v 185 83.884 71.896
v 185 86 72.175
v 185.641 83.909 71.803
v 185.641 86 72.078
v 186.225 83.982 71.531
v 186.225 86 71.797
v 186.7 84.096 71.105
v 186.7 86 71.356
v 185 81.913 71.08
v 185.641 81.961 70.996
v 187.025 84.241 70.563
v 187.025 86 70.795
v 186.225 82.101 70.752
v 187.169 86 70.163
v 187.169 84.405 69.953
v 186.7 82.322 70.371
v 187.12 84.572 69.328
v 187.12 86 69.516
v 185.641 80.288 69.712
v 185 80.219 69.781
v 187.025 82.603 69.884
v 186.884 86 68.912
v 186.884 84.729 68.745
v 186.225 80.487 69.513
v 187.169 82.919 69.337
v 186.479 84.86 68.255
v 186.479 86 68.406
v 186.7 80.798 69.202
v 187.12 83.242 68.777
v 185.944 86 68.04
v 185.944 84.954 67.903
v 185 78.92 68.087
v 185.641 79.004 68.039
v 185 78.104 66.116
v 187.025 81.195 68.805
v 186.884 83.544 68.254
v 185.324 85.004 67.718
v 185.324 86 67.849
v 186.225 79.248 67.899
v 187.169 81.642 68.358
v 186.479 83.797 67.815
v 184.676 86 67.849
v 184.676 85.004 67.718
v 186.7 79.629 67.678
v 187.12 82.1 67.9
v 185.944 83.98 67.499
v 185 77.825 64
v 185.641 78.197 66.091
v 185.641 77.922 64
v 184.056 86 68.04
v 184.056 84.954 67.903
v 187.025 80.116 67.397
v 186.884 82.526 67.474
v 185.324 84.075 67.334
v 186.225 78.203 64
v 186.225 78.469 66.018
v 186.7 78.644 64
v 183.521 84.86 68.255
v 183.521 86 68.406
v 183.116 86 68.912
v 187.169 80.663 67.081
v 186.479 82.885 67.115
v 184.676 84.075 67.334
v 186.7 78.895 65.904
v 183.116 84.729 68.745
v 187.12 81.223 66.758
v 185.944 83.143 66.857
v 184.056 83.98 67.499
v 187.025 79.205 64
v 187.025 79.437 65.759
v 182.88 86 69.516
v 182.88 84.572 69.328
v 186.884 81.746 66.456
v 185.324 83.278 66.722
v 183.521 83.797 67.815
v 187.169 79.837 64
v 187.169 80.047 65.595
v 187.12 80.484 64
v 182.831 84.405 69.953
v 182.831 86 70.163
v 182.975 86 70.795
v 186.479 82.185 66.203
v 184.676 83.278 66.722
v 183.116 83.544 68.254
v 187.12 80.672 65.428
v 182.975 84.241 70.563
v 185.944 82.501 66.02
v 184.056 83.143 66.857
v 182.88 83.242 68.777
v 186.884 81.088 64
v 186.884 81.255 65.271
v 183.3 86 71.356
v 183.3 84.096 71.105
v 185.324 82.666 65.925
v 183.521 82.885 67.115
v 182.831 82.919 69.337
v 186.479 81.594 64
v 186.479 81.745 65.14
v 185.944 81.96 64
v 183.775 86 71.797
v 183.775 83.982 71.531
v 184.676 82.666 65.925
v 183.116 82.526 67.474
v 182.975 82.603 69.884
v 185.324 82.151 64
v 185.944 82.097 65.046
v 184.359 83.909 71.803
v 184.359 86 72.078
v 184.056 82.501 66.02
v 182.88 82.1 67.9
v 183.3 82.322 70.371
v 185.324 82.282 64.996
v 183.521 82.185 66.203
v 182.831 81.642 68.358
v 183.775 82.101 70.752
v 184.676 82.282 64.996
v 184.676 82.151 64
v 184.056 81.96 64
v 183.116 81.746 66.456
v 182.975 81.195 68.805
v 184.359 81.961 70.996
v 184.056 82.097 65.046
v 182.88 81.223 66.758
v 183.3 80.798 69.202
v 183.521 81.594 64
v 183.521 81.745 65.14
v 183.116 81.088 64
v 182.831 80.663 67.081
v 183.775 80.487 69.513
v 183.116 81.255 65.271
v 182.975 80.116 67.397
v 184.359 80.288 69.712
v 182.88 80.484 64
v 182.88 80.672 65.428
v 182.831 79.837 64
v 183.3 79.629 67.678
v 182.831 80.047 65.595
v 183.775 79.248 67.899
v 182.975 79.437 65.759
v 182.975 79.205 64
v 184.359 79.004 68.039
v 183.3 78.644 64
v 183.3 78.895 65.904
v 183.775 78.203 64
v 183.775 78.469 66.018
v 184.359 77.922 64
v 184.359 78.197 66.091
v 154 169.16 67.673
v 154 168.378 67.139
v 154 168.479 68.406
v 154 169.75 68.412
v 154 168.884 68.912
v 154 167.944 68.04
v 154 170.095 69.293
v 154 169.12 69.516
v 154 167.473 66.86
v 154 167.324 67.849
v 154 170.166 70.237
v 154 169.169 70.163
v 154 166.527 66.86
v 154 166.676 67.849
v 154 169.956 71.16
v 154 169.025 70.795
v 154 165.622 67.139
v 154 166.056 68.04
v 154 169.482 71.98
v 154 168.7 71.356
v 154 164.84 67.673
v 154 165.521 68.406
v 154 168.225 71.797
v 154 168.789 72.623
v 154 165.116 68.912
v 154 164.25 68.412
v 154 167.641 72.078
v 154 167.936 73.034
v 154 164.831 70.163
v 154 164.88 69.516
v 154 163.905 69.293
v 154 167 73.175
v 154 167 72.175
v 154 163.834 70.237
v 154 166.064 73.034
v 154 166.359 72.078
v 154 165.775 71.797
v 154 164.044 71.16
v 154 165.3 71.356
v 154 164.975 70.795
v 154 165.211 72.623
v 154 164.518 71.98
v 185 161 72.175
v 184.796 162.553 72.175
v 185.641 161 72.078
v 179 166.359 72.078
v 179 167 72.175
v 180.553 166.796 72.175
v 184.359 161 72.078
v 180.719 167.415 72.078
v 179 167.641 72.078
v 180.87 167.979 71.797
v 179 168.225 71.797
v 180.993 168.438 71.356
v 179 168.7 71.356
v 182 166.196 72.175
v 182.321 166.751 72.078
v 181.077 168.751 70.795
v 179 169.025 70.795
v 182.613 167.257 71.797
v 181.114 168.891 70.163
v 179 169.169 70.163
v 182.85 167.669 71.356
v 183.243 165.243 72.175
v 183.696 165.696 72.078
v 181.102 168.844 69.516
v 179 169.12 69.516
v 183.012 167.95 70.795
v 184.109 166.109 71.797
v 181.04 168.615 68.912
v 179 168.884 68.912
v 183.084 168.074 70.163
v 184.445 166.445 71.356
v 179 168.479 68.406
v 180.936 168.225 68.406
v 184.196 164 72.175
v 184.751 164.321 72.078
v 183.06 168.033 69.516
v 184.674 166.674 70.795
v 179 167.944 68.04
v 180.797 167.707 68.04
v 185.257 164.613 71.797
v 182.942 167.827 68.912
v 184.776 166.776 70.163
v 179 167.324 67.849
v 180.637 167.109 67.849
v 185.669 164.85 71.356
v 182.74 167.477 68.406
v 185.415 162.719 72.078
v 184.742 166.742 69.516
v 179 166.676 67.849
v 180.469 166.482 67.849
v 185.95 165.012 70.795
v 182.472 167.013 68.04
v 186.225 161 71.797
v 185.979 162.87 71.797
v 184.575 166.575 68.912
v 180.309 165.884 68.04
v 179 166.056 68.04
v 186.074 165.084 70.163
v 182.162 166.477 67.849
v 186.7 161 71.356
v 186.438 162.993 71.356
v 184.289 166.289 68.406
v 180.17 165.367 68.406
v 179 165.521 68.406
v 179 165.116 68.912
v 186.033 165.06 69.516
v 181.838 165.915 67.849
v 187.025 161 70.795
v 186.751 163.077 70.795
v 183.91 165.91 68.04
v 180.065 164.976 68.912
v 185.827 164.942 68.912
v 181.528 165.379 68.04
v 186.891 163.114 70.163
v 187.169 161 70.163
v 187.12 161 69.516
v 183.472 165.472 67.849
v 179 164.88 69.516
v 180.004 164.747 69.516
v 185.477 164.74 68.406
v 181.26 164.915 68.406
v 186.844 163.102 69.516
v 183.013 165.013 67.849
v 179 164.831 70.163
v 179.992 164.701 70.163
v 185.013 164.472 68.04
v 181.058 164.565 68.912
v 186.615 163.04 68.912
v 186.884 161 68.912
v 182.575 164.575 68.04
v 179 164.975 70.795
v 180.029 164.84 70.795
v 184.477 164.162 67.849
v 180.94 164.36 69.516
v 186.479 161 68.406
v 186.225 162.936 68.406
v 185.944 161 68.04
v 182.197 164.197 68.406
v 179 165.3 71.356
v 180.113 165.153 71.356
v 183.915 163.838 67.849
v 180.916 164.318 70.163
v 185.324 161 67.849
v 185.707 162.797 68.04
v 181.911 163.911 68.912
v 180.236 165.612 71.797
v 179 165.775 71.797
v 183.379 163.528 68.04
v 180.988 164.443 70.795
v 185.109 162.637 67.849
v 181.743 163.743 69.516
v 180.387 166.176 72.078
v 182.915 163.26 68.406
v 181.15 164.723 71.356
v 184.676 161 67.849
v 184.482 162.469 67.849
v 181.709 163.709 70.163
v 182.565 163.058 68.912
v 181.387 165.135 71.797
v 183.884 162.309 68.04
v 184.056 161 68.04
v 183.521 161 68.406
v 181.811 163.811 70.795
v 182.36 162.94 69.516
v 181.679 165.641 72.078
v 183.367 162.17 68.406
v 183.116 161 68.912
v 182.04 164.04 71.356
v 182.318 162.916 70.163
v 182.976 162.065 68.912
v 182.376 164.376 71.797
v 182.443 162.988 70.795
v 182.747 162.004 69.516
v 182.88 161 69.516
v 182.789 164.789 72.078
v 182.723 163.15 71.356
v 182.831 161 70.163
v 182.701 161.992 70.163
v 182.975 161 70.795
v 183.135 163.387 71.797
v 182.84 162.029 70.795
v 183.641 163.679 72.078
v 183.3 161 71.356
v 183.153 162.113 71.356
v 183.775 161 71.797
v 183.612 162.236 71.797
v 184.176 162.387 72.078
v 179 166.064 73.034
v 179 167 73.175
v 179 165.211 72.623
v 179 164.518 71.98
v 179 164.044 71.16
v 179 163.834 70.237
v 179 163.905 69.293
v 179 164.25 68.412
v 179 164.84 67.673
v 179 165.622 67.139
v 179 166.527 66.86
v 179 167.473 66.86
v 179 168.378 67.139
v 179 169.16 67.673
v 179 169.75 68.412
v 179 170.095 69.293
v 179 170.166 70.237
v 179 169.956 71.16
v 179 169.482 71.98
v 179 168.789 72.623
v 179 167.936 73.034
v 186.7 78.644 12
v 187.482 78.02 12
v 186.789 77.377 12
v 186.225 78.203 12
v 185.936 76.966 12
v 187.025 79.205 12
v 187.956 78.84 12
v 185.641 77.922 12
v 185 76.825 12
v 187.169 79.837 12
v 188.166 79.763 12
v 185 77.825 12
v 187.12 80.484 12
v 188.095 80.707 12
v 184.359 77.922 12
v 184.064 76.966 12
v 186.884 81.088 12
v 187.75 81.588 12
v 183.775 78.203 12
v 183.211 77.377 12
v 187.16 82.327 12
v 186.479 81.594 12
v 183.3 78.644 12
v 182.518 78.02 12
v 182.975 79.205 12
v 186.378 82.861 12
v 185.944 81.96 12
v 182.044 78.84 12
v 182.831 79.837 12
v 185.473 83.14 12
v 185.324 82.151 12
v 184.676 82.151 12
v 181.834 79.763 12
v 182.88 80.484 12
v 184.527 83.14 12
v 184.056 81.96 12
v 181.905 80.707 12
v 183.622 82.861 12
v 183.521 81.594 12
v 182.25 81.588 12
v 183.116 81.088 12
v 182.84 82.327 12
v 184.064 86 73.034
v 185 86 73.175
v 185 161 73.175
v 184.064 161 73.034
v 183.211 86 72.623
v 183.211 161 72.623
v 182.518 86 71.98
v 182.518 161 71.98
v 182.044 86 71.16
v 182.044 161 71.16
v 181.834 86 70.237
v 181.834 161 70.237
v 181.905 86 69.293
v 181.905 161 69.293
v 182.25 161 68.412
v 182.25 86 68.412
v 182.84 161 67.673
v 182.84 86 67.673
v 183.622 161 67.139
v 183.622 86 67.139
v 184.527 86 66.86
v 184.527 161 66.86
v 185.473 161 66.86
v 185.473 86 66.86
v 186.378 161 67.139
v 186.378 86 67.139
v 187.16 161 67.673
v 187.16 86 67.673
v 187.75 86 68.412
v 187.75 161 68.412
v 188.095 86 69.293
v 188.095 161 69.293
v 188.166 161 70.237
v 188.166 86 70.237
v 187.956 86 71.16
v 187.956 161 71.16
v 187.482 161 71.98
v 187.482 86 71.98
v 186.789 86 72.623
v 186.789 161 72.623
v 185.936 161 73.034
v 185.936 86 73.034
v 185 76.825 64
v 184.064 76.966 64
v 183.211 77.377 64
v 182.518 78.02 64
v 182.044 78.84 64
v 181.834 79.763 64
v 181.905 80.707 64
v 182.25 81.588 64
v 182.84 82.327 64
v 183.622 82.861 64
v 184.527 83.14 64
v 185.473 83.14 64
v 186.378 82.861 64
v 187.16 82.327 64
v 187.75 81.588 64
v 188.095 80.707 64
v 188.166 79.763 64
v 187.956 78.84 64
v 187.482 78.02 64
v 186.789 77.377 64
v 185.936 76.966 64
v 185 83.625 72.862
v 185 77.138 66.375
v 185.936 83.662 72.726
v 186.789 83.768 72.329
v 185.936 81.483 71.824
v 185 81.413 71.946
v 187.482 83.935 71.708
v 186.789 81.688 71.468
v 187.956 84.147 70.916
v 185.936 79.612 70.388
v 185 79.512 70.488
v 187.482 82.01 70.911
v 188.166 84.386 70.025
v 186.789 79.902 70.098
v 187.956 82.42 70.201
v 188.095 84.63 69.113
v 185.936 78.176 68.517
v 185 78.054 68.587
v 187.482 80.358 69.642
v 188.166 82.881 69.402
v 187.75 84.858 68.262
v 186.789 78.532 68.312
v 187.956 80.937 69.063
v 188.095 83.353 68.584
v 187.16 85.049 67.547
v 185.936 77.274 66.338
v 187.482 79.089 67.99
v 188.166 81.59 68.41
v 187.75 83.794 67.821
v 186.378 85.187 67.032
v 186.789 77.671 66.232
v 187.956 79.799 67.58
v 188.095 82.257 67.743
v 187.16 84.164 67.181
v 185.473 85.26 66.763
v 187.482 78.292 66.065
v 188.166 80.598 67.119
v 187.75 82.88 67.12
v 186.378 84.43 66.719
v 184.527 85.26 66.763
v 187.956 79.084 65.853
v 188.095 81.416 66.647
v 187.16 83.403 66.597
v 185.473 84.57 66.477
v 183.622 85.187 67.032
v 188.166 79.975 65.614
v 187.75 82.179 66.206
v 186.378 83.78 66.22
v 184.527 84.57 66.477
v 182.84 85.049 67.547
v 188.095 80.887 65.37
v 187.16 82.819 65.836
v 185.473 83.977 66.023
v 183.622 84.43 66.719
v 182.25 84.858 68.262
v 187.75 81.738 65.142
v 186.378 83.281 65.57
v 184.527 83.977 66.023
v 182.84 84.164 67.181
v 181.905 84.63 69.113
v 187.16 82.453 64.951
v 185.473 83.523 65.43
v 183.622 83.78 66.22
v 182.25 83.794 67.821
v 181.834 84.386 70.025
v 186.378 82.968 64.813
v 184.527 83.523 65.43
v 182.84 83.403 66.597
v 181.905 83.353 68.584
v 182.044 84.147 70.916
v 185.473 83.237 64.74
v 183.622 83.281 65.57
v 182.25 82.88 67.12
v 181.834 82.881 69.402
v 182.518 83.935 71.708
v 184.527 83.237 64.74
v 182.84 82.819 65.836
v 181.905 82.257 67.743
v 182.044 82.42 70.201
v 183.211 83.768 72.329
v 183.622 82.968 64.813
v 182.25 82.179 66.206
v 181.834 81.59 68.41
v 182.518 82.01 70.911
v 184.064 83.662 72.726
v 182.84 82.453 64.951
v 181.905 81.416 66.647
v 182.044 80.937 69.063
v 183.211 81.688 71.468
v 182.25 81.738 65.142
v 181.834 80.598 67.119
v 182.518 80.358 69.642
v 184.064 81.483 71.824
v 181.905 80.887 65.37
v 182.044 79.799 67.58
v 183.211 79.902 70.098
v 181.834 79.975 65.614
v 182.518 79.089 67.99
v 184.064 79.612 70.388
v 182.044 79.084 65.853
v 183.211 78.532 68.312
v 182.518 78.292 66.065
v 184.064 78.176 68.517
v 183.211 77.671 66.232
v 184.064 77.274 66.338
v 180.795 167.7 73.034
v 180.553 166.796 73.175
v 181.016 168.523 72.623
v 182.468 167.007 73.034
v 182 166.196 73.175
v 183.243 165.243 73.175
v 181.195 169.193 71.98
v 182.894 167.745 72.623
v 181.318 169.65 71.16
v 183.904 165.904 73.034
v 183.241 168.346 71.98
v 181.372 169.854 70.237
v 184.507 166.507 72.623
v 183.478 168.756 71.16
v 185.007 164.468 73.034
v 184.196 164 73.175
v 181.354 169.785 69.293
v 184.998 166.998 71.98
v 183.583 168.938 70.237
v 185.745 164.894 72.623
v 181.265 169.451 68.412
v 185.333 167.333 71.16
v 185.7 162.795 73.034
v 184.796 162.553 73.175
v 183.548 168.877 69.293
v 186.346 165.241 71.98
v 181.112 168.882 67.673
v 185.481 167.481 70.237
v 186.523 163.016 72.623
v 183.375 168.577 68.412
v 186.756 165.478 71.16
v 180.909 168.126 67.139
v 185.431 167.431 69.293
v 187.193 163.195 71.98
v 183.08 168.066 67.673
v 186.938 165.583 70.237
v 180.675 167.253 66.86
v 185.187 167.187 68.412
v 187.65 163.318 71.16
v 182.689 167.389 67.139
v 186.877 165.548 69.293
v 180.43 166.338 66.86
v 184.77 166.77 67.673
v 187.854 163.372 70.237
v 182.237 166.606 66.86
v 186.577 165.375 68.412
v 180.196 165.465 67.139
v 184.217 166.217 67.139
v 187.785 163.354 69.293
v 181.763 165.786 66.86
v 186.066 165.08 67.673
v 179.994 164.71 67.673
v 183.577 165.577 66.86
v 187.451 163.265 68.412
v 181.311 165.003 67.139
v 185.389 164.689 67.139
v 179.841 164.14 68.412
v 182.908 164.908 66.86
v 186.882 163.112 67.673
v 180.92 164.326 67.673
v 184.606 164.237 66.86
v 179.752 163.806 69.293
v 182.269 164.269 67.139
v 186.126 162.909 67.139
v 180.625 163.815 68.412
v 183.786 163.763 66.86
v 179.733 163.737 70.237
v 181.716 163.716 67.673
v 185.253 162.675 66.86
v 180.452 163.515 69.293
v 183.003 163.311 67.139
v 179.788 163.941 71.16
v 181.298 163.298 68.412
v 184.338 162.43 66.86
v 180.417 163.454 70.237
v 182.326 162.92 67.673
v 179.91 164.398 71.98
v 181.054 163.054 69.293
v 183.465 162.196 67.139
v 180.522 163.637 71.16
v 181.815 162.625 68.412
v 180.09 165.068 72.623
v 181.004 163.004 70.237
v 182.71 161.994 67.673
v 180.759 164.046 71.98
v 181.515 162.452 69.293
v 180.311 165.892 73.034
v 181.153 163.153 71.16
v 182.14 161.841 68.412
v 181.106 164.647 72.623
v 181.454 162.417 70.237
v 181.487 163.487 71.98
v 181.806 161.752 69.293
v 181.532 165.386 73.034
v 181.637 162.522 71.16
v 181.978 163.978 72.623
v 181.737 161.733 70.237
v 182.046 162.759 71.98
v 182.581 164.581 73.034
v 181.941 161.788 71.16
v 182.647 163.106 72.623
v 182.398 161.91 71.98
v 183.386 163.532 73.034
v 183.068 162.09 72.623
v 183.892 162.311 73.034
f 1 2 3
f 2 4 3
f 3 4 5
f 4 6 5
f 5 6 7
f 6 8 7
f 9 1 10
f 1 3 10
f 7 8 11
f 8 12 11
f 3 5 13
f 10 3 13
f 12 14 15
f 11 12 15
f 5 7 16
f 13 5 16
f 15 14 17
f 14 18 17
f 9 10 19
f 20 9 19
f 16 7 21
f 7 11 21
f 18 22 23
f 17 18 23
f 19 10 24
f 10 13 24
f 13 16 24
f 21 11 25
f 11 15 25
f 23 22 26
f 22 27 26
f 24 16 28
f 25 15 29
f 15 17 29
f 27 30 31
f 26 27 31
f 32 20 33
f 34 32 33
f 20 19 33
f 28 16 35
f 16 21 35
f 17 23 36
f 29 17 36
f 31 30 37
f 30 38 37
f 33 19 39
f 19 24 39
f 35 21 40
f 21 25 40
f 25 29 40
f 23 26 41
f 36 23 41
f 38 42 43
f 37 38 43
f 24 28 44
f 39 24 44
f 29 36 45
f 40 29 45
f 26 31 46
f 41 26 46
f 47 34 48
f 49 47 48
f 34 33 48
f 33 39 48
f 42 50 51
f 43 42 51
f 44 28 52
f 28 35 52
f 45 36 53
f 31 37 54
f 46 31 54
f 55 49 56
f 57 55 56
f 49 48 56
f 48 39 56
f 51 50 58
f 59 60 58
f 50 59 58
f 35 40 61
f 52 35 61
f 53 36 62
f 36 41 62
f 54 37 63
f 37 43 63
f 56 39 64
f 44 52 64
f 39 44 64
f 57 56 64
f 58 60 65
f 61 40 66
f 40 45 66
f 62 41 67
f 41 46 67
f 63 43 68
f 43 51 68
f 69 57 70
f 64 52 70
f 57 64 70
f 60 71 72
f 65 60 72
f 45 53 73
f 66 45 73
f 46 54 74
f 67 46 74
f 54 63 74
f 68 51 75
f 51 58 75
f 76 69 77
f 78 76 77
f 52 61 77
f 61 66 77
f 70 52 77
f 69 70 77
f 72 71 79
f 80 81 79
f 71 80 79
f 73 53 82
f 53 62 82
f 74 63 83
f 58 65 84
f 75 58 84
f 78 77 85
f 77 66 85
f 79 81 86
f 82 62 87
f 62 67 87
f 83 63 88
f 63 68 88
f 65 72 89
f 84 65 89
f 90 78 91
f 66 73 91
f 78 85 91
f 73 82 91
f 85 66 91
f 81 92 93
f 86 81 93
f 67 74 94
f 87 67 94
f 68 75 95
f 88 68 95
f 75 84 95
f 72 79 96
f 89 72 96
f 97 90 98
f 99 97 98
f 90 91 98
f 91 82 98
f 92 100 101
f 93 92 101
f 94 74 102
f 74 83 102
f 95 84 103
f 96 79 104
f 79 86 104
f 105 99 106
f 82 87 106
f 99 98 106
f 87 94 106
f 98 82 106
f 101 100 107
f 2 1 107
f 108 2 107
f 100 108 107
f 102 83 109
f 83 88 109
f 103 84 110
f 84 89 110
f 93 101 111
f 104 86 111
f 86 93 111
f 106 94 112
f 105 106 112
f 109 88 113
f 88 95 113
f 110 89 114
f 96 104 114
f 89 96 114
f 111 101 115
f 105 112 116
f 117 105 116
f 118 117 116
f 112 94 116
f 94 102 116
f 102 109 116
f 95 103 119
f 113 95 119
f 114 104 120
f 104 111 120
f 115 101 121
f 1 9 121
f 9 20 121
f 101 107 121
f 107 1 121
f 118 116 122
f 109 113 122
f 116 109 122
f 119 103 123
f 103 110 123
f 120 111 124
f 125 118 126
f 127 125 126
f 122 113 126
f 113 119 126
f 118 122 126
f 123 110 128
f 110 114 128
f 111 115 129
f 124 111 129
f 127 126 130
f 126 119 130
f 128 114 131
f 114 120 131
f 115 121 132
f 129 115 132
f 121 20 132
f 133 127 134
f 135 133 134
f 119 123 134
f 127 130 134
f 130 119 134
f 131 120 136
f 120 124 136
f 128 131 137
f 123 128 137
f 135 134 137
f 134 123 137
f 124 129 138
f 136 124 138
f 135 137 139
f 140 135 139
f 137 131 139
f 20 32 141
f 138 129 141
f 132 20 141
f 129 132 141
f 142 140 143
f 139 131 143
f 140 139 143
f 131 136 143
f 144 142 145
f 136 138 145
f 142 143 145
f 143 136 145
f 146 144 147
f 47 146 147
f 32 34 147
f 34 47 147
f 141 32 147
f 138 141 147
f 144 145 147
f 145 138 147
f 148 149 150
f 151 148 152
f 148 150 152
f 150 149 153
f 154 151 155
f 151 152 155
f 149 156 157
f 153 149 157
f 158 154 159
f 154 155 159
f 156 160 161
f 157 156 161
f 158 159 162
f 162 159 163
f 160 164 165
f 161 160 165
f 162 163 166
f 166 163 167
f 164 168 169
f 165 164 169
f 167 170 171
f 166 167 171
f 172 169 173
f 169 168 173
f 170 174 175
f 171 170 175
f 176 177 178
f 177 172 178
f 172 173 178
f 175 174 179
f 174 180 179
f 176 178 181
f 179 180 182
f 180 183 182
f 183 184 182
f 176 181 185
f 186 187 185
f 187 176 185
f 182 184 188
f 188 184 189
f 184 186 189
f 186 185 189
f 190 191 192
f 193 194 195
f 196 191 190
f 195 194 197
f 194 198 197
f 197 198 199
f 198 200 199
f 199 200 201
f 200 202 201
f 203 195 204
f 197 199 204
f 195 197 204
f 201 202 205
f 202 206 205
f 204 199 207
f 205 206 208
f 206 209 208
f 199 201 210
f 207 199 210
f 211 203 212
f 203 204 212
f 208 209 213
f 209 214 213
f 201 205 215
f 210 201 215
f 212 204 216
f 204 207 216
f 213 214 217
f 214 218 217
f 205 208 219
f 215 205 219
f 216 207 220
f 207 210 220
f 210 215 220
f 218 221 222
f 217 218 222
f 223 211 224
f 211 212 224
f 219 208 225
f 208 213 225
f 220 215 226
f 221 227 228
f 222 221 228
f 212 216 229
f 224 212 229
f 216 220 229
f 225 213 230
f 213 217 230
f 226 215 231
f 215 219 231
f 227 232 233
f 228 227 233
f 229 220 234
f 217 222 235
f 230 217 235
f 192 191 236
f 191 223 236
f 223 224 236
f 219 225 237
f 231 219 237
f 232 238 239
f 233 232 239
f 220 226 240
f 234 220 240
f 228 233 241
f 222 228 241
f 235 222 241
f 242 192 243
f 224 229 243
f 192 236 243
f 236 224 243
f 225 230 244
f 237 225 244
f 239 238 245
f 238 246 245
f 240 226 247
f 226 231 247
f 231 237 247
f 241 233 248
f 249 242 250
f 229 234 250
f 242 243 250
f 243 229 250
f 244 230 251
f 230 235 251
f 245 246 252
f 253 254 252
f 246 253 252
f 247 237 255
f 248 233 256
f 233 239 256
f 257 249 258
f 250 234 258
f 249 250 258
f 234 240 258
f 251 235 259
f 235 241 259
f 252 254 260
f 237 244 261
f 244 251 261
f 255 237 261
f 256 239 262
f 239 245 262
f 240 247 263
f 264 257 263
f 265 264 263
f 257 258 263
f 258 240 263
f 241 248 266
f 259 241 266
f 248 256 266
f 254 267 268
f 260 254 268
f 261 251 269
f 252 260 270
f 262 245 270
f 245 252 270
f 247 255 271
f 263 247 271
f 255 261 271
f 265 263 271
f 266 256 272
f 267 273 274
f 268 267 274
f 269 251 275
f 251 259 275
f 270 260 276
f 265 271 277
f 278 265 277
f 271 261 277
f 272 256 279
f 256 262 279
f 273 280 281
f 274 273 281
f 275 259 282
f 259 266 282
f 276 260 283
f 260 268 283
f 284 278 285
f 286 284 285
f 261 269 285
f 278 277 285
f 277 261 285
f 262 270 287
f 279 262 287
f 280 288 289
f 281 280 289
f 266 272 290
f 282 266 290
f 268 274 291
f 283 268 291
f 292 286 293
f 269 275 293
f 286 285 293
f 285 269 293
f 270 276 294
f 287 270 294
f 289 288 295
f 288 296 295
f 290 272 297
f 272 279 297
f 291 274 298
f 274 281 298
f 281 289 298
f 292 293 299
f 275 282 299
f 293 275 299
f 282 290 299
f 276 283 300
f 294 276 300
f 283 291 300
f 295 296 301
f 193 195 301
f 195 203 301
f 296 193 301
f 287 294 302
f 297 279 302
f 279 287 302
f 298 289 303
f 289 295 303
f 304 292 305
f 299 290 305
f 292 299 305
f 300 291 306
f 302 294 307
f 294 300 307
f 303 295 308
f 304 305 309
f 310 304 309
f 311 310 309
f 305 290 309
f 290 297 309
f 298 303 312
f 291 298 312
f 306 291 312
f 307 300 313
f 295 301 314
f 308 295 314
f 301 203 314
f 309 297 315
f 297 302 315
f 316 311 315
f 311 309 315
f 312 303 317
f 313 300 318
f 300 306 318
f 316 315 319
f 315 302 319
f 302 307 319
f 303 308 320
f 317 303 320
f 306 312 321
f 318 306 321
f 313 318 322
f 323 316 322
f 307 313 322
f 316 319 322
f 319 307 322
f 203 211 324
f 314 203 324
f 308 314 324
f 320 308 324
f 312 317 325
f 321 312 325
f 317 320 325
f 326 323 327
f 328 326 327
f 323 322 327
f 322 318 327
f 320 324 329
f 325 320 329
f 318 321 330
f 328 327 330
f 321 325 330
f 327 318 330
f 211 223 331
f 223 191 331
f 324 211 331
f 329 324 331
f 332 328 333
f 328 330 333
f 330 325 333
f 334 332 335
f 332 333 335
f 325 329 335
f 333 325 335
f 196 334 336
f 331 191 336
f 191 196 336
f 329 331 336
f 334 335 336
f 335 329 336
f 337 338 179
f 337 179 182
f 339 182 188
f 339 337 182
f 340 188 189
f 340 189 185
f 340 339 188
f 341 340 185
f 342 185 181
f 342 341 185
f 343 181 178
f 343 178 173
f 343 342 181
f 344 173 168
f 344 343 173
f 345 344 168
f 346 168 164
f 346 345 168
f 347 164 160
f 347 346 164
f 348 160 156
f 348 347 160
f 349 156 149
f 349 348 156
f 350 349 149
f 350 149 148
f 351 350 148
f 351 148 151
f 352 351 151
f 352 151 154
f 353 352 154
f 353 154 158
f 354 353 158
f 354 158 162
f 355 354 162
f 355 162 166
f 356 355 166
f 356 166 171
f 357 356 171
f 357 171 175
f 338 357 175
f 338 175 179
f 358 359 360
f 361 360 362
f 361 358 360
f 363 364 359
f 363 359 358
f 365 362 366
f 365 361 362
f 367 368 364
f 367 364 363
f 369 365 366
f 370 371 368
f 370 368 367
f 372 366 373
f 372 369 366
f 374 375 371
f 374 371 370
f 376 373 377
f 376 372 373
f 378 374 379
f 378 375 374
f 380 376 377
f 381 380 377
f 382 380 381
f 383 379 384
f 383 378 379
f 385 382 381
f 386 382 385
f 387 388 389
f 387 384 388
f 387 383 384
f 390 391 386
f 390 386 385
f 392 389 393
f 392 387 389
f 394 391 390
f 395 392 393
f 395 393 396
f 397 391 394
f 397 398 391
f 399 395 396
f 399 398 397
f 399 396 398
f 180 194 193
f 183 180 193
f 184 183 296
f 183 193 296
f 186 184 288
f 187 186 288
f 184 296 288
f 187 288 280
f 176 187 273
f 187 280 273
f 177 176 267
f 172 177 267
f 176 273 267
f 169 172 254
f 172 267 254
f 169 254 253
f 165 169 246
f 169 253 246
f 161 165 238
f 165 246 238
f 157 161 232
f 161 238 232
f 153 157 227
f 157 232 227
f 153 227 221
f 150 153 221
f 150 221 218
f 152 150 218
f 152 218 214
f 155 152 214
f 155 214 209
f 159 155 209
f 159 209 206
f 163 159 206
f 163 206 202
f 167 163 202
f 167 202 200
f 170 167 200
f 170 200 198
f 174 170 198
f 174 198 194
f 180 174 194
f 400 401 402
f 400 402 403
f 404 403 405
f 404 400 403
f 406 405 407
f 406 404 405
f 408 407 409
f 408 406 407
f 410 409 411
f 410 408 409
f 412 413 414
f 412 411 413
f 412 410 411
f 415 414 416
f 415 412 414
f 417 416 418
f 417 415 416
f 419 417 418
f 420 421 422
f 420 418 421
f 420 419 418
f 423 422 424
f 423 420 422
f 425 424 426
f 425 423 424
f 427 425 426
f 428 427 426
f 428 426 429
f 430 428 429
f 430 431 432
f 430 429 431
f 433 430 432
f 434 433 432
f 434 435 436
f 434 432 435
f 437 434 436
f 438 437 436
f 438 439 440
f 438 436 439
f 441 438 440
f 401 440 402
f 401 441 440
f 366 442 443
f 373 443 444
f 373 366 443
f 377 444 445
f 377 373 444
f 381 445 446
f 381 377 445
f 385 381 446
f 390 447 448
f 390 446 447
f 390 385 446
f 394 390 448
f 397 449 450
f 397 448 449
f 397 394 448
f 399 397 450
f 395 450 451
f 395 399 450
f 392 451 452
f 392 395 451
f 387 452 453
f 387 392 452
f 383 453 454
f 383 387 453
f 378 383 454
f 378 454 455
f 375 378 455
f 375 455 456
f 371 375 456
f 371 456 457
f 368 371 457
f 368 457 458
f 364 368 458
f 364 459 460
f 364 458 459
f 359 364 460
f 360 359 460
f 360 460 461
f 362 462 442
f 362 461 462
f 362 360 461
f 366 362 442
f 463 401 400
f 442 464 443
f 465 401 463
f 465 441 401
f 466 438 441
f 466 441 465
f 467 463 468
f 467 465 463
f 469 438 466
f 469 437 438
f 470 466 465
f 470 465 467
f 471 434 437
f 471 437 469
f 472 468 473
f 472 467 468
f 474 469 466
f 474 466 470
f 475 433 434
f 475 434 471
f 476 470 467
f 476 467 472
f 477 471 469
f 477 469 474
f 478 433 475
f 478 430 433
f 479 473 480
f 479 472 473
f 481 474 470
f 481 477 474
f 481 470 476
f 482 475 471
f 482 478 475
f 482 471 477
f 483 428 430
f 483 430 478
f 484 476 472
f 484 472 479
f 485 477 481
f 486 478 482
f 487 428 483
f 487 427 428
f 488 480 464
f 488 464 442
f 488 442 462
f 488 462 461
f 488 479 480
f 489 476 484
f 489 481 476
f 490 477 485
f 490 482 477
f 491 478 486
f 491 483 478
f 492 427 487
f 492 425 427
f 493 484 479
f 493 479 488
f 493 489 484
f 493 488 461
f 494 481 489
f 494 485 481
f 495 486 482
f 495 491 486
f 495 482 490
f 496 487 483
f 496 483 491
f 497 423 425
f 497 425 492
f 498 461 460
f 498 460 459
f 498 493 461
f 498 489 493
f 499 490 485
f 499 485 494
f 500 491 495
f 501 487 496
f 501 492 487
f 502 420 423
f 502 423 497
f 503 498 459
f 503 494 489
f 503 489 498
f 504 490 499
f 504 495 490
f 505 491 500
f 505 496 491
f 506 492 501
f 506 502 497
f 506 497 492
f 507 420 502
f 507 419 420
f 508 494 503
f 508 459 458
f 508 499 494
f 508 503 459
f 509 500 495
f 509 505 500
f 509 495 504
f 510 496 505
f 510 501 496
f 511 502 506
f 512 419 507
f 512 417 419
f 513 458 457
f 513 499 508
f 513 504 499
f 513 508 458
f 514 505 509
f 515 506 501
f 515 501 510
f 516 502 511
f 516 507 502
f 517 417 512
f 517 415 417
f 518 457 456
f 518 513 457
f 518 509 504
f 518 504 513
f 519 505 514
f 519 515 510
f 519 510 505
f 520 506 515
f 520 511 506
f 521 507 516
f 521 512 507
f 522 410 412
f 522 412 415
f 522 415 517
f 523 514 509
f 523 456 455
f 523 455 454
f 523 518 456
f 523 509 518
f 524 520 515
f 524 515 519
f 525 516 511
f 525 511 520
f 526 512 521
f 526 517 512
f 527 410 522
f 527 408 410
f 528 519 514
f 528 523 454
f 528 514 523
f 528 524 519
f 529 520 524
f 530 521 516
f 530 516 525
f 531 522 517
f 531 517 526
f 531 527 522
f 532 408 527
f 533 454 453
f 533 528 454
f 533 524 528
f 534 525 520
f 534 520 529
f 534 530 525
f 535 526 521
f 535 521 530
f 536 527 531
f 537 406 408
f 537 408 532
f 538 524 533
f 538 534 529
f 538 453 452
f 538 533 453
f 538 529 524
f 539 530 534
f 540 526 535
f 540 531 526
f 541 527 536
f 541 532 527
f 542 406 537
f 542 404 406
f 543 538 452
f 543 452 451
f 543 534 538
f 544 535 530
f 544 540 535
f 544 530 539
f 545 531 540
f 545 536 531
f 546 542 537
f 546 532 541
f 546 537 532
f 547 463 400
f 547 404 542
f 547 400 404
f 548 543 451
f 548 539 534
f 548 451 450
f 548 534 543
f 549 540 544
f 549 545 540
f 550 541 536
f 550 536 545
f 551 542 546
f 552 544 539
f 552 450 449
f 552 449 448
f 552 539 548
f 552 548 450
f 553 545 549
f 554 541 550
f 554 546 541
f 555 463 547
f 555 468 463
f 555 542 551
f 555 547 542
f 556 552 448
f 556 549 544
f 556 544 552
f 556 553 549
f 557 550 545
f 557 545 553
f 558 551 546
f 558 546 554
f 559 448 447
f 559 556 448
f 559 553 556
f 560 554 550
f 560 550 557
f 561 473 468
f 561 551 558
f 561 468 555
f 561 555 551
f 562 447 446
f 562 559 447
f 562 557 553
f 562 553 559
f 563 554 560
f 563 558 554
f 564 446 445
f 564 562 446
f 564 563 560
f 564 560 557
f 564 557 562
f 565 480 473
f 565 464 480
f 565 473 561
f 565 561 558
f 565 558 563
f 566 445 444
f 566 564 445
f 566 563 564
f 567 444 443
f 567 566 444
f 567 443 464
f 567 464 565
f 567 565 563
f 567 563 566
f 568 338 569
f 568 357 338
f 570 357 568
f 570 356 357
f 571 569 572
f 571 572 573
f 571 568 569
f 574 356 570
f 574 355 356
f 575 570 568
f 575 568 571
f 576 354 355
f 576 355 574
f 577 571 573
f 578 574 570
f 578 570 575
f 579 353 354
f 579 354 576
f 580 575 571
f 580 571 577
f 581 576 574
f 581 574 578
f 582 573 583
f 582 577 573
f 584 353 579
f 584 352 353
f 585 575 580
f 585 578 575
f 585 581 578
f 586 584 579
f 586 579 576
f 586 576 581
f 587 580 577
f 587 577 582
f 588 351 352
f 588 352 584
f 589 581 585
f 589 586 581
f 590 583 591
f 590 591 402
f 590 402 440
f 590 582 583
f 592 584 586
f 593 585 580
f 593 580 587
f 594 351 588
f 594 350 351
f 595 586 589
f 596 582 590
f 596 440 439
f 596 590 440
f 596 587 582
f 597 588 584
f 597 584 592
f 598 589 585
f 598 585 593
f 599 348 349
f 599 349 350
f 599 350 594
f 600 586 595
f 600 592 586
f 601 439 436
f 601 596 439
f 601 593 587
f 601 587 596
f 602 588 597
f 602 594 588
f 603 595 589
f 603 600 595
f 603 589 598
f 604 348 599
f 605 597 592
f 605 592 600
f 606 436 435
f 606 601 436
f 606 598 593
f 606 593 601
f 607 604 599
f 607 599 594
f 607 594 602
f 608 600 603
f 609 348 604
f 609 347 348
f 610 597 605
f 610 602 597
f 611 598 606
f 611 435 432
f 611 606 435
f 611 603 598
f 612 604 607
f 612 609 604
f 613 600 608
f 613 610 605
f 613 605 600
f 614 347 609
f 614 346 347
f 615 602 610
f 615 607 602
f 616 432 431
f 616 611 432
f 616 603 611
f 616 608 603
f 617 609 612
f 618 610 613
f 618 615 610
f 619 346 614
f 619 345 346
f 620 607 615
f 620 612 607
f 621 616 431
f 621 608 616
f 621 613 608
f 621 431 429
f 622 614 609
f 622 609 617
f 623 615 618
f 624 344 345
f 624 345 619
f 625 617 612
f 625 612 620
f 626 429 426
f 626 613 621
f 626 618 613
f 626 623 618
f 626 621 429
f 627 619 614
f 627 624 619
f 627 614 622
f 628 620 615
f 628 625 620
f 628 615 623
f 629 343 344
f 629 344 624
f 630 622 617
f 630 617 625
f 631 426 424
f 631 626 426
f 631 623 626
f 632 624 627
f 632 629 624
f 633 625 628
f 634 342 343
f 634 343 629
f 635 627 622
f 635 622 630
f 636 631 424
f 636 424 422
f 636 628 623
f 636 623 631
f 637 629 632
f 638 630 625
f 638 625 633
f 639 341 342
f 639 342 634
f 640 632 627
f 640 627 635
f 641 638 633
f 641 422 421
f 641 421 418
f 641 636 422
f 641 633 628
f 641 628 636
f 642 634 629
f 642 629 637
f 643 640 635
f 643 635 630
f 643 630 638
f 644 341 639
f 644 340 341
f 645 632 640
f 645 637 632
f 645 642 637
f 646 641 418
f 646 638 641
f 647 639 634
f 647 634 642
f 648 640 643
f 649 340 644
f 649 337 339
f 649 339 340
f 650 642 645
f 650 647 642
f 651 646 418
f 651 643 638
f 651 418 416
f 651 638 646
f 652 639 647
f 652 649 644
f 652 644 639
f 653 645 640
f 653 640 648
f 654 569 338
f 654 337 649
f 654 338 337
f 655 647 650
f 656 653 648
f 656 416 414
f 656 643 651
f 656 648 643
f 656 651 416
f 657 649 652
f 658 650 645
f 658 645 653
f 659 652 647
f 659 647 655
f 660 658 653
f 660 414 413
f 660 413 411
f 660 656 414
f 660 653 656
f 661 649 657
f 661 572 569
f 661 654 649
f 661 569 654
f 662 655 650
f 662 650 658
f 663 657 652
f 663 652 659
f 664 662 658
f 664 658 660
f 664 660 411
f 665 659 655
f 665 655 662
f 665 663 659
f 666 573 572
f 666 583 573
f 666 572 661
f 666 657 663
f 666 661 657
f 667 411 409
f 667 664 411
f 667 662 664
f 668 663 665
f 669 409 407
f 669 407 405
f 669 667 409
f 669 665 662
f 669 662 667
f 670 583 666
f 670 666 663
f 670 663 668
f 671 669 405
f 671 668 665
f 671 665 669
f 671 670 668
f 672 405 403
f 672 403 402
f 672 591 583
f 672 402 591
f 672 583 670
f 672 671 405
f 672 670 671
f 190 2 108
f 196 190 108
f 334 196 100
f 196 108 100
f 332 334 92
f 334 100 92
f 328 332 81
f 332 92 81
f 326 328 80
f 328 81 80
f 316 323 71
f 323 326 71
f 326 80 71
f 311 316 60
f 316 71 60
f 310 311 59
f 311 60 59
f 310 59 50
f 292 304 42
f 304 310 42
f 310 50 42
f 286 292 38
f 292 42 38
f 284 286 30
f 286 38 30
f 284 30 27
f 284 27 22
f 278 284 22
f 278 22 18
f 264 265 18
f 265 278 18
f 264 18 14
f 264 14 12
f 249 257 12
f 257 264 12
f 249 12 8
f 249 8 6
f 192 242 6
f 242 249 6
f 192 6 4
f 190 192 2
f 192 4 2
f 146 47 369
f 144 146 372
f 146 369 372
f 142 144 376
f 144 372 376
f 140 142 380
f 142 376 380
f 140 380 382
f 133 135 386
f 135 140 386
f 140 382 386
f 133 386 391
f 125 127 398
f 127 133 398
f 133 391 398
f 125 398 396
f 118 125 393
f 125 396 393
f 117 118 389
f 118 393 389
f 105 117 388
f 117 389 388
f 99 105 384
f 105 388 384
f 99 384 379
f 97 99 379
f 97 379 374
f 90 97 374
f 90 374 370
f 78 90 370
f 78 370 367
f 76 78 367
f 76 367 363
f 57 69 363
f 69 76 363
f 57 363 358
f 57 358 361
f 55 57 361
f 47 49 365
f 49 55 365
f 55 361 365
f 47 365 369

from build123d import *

# Parameters (mm, degrees)
TUBE_PROFILE_R   = 3.175
TUBE_PROFILE_R_2 = 2.175


with BuildPart() as part:
    # Tube: sweep along a curve in space
    with BuildLine() as tube_path:
        Line((154, 167, 70), (179, 167, 70))
        ThreePointArc((185, 161, 70), (183.242640687, 165.242640687, 70), (179, 167, 70))
        Line((185, 161, 70), (185, 86, 70))
        ThreePointArc((185, 80, 64), (185, 81.757359313, 68.242640687), (185, 86, 70))
        Line((185, 80, 64), (185, 80, 12))
    # Tube profile (on start of the path) → Tube (sweep)
    with BuildSketch(Plane(origin=(154, 167, 70), x_dir=(0, 0, 1), z_dir=(1, 0, 0))):
        Circle(TUBE_PROFILE_R)
        Circle(TUBE_PROFILE_R_2, mode=Mode.SUBTRACT)
    sweep(path=tube_path.line)


solid = part.part
